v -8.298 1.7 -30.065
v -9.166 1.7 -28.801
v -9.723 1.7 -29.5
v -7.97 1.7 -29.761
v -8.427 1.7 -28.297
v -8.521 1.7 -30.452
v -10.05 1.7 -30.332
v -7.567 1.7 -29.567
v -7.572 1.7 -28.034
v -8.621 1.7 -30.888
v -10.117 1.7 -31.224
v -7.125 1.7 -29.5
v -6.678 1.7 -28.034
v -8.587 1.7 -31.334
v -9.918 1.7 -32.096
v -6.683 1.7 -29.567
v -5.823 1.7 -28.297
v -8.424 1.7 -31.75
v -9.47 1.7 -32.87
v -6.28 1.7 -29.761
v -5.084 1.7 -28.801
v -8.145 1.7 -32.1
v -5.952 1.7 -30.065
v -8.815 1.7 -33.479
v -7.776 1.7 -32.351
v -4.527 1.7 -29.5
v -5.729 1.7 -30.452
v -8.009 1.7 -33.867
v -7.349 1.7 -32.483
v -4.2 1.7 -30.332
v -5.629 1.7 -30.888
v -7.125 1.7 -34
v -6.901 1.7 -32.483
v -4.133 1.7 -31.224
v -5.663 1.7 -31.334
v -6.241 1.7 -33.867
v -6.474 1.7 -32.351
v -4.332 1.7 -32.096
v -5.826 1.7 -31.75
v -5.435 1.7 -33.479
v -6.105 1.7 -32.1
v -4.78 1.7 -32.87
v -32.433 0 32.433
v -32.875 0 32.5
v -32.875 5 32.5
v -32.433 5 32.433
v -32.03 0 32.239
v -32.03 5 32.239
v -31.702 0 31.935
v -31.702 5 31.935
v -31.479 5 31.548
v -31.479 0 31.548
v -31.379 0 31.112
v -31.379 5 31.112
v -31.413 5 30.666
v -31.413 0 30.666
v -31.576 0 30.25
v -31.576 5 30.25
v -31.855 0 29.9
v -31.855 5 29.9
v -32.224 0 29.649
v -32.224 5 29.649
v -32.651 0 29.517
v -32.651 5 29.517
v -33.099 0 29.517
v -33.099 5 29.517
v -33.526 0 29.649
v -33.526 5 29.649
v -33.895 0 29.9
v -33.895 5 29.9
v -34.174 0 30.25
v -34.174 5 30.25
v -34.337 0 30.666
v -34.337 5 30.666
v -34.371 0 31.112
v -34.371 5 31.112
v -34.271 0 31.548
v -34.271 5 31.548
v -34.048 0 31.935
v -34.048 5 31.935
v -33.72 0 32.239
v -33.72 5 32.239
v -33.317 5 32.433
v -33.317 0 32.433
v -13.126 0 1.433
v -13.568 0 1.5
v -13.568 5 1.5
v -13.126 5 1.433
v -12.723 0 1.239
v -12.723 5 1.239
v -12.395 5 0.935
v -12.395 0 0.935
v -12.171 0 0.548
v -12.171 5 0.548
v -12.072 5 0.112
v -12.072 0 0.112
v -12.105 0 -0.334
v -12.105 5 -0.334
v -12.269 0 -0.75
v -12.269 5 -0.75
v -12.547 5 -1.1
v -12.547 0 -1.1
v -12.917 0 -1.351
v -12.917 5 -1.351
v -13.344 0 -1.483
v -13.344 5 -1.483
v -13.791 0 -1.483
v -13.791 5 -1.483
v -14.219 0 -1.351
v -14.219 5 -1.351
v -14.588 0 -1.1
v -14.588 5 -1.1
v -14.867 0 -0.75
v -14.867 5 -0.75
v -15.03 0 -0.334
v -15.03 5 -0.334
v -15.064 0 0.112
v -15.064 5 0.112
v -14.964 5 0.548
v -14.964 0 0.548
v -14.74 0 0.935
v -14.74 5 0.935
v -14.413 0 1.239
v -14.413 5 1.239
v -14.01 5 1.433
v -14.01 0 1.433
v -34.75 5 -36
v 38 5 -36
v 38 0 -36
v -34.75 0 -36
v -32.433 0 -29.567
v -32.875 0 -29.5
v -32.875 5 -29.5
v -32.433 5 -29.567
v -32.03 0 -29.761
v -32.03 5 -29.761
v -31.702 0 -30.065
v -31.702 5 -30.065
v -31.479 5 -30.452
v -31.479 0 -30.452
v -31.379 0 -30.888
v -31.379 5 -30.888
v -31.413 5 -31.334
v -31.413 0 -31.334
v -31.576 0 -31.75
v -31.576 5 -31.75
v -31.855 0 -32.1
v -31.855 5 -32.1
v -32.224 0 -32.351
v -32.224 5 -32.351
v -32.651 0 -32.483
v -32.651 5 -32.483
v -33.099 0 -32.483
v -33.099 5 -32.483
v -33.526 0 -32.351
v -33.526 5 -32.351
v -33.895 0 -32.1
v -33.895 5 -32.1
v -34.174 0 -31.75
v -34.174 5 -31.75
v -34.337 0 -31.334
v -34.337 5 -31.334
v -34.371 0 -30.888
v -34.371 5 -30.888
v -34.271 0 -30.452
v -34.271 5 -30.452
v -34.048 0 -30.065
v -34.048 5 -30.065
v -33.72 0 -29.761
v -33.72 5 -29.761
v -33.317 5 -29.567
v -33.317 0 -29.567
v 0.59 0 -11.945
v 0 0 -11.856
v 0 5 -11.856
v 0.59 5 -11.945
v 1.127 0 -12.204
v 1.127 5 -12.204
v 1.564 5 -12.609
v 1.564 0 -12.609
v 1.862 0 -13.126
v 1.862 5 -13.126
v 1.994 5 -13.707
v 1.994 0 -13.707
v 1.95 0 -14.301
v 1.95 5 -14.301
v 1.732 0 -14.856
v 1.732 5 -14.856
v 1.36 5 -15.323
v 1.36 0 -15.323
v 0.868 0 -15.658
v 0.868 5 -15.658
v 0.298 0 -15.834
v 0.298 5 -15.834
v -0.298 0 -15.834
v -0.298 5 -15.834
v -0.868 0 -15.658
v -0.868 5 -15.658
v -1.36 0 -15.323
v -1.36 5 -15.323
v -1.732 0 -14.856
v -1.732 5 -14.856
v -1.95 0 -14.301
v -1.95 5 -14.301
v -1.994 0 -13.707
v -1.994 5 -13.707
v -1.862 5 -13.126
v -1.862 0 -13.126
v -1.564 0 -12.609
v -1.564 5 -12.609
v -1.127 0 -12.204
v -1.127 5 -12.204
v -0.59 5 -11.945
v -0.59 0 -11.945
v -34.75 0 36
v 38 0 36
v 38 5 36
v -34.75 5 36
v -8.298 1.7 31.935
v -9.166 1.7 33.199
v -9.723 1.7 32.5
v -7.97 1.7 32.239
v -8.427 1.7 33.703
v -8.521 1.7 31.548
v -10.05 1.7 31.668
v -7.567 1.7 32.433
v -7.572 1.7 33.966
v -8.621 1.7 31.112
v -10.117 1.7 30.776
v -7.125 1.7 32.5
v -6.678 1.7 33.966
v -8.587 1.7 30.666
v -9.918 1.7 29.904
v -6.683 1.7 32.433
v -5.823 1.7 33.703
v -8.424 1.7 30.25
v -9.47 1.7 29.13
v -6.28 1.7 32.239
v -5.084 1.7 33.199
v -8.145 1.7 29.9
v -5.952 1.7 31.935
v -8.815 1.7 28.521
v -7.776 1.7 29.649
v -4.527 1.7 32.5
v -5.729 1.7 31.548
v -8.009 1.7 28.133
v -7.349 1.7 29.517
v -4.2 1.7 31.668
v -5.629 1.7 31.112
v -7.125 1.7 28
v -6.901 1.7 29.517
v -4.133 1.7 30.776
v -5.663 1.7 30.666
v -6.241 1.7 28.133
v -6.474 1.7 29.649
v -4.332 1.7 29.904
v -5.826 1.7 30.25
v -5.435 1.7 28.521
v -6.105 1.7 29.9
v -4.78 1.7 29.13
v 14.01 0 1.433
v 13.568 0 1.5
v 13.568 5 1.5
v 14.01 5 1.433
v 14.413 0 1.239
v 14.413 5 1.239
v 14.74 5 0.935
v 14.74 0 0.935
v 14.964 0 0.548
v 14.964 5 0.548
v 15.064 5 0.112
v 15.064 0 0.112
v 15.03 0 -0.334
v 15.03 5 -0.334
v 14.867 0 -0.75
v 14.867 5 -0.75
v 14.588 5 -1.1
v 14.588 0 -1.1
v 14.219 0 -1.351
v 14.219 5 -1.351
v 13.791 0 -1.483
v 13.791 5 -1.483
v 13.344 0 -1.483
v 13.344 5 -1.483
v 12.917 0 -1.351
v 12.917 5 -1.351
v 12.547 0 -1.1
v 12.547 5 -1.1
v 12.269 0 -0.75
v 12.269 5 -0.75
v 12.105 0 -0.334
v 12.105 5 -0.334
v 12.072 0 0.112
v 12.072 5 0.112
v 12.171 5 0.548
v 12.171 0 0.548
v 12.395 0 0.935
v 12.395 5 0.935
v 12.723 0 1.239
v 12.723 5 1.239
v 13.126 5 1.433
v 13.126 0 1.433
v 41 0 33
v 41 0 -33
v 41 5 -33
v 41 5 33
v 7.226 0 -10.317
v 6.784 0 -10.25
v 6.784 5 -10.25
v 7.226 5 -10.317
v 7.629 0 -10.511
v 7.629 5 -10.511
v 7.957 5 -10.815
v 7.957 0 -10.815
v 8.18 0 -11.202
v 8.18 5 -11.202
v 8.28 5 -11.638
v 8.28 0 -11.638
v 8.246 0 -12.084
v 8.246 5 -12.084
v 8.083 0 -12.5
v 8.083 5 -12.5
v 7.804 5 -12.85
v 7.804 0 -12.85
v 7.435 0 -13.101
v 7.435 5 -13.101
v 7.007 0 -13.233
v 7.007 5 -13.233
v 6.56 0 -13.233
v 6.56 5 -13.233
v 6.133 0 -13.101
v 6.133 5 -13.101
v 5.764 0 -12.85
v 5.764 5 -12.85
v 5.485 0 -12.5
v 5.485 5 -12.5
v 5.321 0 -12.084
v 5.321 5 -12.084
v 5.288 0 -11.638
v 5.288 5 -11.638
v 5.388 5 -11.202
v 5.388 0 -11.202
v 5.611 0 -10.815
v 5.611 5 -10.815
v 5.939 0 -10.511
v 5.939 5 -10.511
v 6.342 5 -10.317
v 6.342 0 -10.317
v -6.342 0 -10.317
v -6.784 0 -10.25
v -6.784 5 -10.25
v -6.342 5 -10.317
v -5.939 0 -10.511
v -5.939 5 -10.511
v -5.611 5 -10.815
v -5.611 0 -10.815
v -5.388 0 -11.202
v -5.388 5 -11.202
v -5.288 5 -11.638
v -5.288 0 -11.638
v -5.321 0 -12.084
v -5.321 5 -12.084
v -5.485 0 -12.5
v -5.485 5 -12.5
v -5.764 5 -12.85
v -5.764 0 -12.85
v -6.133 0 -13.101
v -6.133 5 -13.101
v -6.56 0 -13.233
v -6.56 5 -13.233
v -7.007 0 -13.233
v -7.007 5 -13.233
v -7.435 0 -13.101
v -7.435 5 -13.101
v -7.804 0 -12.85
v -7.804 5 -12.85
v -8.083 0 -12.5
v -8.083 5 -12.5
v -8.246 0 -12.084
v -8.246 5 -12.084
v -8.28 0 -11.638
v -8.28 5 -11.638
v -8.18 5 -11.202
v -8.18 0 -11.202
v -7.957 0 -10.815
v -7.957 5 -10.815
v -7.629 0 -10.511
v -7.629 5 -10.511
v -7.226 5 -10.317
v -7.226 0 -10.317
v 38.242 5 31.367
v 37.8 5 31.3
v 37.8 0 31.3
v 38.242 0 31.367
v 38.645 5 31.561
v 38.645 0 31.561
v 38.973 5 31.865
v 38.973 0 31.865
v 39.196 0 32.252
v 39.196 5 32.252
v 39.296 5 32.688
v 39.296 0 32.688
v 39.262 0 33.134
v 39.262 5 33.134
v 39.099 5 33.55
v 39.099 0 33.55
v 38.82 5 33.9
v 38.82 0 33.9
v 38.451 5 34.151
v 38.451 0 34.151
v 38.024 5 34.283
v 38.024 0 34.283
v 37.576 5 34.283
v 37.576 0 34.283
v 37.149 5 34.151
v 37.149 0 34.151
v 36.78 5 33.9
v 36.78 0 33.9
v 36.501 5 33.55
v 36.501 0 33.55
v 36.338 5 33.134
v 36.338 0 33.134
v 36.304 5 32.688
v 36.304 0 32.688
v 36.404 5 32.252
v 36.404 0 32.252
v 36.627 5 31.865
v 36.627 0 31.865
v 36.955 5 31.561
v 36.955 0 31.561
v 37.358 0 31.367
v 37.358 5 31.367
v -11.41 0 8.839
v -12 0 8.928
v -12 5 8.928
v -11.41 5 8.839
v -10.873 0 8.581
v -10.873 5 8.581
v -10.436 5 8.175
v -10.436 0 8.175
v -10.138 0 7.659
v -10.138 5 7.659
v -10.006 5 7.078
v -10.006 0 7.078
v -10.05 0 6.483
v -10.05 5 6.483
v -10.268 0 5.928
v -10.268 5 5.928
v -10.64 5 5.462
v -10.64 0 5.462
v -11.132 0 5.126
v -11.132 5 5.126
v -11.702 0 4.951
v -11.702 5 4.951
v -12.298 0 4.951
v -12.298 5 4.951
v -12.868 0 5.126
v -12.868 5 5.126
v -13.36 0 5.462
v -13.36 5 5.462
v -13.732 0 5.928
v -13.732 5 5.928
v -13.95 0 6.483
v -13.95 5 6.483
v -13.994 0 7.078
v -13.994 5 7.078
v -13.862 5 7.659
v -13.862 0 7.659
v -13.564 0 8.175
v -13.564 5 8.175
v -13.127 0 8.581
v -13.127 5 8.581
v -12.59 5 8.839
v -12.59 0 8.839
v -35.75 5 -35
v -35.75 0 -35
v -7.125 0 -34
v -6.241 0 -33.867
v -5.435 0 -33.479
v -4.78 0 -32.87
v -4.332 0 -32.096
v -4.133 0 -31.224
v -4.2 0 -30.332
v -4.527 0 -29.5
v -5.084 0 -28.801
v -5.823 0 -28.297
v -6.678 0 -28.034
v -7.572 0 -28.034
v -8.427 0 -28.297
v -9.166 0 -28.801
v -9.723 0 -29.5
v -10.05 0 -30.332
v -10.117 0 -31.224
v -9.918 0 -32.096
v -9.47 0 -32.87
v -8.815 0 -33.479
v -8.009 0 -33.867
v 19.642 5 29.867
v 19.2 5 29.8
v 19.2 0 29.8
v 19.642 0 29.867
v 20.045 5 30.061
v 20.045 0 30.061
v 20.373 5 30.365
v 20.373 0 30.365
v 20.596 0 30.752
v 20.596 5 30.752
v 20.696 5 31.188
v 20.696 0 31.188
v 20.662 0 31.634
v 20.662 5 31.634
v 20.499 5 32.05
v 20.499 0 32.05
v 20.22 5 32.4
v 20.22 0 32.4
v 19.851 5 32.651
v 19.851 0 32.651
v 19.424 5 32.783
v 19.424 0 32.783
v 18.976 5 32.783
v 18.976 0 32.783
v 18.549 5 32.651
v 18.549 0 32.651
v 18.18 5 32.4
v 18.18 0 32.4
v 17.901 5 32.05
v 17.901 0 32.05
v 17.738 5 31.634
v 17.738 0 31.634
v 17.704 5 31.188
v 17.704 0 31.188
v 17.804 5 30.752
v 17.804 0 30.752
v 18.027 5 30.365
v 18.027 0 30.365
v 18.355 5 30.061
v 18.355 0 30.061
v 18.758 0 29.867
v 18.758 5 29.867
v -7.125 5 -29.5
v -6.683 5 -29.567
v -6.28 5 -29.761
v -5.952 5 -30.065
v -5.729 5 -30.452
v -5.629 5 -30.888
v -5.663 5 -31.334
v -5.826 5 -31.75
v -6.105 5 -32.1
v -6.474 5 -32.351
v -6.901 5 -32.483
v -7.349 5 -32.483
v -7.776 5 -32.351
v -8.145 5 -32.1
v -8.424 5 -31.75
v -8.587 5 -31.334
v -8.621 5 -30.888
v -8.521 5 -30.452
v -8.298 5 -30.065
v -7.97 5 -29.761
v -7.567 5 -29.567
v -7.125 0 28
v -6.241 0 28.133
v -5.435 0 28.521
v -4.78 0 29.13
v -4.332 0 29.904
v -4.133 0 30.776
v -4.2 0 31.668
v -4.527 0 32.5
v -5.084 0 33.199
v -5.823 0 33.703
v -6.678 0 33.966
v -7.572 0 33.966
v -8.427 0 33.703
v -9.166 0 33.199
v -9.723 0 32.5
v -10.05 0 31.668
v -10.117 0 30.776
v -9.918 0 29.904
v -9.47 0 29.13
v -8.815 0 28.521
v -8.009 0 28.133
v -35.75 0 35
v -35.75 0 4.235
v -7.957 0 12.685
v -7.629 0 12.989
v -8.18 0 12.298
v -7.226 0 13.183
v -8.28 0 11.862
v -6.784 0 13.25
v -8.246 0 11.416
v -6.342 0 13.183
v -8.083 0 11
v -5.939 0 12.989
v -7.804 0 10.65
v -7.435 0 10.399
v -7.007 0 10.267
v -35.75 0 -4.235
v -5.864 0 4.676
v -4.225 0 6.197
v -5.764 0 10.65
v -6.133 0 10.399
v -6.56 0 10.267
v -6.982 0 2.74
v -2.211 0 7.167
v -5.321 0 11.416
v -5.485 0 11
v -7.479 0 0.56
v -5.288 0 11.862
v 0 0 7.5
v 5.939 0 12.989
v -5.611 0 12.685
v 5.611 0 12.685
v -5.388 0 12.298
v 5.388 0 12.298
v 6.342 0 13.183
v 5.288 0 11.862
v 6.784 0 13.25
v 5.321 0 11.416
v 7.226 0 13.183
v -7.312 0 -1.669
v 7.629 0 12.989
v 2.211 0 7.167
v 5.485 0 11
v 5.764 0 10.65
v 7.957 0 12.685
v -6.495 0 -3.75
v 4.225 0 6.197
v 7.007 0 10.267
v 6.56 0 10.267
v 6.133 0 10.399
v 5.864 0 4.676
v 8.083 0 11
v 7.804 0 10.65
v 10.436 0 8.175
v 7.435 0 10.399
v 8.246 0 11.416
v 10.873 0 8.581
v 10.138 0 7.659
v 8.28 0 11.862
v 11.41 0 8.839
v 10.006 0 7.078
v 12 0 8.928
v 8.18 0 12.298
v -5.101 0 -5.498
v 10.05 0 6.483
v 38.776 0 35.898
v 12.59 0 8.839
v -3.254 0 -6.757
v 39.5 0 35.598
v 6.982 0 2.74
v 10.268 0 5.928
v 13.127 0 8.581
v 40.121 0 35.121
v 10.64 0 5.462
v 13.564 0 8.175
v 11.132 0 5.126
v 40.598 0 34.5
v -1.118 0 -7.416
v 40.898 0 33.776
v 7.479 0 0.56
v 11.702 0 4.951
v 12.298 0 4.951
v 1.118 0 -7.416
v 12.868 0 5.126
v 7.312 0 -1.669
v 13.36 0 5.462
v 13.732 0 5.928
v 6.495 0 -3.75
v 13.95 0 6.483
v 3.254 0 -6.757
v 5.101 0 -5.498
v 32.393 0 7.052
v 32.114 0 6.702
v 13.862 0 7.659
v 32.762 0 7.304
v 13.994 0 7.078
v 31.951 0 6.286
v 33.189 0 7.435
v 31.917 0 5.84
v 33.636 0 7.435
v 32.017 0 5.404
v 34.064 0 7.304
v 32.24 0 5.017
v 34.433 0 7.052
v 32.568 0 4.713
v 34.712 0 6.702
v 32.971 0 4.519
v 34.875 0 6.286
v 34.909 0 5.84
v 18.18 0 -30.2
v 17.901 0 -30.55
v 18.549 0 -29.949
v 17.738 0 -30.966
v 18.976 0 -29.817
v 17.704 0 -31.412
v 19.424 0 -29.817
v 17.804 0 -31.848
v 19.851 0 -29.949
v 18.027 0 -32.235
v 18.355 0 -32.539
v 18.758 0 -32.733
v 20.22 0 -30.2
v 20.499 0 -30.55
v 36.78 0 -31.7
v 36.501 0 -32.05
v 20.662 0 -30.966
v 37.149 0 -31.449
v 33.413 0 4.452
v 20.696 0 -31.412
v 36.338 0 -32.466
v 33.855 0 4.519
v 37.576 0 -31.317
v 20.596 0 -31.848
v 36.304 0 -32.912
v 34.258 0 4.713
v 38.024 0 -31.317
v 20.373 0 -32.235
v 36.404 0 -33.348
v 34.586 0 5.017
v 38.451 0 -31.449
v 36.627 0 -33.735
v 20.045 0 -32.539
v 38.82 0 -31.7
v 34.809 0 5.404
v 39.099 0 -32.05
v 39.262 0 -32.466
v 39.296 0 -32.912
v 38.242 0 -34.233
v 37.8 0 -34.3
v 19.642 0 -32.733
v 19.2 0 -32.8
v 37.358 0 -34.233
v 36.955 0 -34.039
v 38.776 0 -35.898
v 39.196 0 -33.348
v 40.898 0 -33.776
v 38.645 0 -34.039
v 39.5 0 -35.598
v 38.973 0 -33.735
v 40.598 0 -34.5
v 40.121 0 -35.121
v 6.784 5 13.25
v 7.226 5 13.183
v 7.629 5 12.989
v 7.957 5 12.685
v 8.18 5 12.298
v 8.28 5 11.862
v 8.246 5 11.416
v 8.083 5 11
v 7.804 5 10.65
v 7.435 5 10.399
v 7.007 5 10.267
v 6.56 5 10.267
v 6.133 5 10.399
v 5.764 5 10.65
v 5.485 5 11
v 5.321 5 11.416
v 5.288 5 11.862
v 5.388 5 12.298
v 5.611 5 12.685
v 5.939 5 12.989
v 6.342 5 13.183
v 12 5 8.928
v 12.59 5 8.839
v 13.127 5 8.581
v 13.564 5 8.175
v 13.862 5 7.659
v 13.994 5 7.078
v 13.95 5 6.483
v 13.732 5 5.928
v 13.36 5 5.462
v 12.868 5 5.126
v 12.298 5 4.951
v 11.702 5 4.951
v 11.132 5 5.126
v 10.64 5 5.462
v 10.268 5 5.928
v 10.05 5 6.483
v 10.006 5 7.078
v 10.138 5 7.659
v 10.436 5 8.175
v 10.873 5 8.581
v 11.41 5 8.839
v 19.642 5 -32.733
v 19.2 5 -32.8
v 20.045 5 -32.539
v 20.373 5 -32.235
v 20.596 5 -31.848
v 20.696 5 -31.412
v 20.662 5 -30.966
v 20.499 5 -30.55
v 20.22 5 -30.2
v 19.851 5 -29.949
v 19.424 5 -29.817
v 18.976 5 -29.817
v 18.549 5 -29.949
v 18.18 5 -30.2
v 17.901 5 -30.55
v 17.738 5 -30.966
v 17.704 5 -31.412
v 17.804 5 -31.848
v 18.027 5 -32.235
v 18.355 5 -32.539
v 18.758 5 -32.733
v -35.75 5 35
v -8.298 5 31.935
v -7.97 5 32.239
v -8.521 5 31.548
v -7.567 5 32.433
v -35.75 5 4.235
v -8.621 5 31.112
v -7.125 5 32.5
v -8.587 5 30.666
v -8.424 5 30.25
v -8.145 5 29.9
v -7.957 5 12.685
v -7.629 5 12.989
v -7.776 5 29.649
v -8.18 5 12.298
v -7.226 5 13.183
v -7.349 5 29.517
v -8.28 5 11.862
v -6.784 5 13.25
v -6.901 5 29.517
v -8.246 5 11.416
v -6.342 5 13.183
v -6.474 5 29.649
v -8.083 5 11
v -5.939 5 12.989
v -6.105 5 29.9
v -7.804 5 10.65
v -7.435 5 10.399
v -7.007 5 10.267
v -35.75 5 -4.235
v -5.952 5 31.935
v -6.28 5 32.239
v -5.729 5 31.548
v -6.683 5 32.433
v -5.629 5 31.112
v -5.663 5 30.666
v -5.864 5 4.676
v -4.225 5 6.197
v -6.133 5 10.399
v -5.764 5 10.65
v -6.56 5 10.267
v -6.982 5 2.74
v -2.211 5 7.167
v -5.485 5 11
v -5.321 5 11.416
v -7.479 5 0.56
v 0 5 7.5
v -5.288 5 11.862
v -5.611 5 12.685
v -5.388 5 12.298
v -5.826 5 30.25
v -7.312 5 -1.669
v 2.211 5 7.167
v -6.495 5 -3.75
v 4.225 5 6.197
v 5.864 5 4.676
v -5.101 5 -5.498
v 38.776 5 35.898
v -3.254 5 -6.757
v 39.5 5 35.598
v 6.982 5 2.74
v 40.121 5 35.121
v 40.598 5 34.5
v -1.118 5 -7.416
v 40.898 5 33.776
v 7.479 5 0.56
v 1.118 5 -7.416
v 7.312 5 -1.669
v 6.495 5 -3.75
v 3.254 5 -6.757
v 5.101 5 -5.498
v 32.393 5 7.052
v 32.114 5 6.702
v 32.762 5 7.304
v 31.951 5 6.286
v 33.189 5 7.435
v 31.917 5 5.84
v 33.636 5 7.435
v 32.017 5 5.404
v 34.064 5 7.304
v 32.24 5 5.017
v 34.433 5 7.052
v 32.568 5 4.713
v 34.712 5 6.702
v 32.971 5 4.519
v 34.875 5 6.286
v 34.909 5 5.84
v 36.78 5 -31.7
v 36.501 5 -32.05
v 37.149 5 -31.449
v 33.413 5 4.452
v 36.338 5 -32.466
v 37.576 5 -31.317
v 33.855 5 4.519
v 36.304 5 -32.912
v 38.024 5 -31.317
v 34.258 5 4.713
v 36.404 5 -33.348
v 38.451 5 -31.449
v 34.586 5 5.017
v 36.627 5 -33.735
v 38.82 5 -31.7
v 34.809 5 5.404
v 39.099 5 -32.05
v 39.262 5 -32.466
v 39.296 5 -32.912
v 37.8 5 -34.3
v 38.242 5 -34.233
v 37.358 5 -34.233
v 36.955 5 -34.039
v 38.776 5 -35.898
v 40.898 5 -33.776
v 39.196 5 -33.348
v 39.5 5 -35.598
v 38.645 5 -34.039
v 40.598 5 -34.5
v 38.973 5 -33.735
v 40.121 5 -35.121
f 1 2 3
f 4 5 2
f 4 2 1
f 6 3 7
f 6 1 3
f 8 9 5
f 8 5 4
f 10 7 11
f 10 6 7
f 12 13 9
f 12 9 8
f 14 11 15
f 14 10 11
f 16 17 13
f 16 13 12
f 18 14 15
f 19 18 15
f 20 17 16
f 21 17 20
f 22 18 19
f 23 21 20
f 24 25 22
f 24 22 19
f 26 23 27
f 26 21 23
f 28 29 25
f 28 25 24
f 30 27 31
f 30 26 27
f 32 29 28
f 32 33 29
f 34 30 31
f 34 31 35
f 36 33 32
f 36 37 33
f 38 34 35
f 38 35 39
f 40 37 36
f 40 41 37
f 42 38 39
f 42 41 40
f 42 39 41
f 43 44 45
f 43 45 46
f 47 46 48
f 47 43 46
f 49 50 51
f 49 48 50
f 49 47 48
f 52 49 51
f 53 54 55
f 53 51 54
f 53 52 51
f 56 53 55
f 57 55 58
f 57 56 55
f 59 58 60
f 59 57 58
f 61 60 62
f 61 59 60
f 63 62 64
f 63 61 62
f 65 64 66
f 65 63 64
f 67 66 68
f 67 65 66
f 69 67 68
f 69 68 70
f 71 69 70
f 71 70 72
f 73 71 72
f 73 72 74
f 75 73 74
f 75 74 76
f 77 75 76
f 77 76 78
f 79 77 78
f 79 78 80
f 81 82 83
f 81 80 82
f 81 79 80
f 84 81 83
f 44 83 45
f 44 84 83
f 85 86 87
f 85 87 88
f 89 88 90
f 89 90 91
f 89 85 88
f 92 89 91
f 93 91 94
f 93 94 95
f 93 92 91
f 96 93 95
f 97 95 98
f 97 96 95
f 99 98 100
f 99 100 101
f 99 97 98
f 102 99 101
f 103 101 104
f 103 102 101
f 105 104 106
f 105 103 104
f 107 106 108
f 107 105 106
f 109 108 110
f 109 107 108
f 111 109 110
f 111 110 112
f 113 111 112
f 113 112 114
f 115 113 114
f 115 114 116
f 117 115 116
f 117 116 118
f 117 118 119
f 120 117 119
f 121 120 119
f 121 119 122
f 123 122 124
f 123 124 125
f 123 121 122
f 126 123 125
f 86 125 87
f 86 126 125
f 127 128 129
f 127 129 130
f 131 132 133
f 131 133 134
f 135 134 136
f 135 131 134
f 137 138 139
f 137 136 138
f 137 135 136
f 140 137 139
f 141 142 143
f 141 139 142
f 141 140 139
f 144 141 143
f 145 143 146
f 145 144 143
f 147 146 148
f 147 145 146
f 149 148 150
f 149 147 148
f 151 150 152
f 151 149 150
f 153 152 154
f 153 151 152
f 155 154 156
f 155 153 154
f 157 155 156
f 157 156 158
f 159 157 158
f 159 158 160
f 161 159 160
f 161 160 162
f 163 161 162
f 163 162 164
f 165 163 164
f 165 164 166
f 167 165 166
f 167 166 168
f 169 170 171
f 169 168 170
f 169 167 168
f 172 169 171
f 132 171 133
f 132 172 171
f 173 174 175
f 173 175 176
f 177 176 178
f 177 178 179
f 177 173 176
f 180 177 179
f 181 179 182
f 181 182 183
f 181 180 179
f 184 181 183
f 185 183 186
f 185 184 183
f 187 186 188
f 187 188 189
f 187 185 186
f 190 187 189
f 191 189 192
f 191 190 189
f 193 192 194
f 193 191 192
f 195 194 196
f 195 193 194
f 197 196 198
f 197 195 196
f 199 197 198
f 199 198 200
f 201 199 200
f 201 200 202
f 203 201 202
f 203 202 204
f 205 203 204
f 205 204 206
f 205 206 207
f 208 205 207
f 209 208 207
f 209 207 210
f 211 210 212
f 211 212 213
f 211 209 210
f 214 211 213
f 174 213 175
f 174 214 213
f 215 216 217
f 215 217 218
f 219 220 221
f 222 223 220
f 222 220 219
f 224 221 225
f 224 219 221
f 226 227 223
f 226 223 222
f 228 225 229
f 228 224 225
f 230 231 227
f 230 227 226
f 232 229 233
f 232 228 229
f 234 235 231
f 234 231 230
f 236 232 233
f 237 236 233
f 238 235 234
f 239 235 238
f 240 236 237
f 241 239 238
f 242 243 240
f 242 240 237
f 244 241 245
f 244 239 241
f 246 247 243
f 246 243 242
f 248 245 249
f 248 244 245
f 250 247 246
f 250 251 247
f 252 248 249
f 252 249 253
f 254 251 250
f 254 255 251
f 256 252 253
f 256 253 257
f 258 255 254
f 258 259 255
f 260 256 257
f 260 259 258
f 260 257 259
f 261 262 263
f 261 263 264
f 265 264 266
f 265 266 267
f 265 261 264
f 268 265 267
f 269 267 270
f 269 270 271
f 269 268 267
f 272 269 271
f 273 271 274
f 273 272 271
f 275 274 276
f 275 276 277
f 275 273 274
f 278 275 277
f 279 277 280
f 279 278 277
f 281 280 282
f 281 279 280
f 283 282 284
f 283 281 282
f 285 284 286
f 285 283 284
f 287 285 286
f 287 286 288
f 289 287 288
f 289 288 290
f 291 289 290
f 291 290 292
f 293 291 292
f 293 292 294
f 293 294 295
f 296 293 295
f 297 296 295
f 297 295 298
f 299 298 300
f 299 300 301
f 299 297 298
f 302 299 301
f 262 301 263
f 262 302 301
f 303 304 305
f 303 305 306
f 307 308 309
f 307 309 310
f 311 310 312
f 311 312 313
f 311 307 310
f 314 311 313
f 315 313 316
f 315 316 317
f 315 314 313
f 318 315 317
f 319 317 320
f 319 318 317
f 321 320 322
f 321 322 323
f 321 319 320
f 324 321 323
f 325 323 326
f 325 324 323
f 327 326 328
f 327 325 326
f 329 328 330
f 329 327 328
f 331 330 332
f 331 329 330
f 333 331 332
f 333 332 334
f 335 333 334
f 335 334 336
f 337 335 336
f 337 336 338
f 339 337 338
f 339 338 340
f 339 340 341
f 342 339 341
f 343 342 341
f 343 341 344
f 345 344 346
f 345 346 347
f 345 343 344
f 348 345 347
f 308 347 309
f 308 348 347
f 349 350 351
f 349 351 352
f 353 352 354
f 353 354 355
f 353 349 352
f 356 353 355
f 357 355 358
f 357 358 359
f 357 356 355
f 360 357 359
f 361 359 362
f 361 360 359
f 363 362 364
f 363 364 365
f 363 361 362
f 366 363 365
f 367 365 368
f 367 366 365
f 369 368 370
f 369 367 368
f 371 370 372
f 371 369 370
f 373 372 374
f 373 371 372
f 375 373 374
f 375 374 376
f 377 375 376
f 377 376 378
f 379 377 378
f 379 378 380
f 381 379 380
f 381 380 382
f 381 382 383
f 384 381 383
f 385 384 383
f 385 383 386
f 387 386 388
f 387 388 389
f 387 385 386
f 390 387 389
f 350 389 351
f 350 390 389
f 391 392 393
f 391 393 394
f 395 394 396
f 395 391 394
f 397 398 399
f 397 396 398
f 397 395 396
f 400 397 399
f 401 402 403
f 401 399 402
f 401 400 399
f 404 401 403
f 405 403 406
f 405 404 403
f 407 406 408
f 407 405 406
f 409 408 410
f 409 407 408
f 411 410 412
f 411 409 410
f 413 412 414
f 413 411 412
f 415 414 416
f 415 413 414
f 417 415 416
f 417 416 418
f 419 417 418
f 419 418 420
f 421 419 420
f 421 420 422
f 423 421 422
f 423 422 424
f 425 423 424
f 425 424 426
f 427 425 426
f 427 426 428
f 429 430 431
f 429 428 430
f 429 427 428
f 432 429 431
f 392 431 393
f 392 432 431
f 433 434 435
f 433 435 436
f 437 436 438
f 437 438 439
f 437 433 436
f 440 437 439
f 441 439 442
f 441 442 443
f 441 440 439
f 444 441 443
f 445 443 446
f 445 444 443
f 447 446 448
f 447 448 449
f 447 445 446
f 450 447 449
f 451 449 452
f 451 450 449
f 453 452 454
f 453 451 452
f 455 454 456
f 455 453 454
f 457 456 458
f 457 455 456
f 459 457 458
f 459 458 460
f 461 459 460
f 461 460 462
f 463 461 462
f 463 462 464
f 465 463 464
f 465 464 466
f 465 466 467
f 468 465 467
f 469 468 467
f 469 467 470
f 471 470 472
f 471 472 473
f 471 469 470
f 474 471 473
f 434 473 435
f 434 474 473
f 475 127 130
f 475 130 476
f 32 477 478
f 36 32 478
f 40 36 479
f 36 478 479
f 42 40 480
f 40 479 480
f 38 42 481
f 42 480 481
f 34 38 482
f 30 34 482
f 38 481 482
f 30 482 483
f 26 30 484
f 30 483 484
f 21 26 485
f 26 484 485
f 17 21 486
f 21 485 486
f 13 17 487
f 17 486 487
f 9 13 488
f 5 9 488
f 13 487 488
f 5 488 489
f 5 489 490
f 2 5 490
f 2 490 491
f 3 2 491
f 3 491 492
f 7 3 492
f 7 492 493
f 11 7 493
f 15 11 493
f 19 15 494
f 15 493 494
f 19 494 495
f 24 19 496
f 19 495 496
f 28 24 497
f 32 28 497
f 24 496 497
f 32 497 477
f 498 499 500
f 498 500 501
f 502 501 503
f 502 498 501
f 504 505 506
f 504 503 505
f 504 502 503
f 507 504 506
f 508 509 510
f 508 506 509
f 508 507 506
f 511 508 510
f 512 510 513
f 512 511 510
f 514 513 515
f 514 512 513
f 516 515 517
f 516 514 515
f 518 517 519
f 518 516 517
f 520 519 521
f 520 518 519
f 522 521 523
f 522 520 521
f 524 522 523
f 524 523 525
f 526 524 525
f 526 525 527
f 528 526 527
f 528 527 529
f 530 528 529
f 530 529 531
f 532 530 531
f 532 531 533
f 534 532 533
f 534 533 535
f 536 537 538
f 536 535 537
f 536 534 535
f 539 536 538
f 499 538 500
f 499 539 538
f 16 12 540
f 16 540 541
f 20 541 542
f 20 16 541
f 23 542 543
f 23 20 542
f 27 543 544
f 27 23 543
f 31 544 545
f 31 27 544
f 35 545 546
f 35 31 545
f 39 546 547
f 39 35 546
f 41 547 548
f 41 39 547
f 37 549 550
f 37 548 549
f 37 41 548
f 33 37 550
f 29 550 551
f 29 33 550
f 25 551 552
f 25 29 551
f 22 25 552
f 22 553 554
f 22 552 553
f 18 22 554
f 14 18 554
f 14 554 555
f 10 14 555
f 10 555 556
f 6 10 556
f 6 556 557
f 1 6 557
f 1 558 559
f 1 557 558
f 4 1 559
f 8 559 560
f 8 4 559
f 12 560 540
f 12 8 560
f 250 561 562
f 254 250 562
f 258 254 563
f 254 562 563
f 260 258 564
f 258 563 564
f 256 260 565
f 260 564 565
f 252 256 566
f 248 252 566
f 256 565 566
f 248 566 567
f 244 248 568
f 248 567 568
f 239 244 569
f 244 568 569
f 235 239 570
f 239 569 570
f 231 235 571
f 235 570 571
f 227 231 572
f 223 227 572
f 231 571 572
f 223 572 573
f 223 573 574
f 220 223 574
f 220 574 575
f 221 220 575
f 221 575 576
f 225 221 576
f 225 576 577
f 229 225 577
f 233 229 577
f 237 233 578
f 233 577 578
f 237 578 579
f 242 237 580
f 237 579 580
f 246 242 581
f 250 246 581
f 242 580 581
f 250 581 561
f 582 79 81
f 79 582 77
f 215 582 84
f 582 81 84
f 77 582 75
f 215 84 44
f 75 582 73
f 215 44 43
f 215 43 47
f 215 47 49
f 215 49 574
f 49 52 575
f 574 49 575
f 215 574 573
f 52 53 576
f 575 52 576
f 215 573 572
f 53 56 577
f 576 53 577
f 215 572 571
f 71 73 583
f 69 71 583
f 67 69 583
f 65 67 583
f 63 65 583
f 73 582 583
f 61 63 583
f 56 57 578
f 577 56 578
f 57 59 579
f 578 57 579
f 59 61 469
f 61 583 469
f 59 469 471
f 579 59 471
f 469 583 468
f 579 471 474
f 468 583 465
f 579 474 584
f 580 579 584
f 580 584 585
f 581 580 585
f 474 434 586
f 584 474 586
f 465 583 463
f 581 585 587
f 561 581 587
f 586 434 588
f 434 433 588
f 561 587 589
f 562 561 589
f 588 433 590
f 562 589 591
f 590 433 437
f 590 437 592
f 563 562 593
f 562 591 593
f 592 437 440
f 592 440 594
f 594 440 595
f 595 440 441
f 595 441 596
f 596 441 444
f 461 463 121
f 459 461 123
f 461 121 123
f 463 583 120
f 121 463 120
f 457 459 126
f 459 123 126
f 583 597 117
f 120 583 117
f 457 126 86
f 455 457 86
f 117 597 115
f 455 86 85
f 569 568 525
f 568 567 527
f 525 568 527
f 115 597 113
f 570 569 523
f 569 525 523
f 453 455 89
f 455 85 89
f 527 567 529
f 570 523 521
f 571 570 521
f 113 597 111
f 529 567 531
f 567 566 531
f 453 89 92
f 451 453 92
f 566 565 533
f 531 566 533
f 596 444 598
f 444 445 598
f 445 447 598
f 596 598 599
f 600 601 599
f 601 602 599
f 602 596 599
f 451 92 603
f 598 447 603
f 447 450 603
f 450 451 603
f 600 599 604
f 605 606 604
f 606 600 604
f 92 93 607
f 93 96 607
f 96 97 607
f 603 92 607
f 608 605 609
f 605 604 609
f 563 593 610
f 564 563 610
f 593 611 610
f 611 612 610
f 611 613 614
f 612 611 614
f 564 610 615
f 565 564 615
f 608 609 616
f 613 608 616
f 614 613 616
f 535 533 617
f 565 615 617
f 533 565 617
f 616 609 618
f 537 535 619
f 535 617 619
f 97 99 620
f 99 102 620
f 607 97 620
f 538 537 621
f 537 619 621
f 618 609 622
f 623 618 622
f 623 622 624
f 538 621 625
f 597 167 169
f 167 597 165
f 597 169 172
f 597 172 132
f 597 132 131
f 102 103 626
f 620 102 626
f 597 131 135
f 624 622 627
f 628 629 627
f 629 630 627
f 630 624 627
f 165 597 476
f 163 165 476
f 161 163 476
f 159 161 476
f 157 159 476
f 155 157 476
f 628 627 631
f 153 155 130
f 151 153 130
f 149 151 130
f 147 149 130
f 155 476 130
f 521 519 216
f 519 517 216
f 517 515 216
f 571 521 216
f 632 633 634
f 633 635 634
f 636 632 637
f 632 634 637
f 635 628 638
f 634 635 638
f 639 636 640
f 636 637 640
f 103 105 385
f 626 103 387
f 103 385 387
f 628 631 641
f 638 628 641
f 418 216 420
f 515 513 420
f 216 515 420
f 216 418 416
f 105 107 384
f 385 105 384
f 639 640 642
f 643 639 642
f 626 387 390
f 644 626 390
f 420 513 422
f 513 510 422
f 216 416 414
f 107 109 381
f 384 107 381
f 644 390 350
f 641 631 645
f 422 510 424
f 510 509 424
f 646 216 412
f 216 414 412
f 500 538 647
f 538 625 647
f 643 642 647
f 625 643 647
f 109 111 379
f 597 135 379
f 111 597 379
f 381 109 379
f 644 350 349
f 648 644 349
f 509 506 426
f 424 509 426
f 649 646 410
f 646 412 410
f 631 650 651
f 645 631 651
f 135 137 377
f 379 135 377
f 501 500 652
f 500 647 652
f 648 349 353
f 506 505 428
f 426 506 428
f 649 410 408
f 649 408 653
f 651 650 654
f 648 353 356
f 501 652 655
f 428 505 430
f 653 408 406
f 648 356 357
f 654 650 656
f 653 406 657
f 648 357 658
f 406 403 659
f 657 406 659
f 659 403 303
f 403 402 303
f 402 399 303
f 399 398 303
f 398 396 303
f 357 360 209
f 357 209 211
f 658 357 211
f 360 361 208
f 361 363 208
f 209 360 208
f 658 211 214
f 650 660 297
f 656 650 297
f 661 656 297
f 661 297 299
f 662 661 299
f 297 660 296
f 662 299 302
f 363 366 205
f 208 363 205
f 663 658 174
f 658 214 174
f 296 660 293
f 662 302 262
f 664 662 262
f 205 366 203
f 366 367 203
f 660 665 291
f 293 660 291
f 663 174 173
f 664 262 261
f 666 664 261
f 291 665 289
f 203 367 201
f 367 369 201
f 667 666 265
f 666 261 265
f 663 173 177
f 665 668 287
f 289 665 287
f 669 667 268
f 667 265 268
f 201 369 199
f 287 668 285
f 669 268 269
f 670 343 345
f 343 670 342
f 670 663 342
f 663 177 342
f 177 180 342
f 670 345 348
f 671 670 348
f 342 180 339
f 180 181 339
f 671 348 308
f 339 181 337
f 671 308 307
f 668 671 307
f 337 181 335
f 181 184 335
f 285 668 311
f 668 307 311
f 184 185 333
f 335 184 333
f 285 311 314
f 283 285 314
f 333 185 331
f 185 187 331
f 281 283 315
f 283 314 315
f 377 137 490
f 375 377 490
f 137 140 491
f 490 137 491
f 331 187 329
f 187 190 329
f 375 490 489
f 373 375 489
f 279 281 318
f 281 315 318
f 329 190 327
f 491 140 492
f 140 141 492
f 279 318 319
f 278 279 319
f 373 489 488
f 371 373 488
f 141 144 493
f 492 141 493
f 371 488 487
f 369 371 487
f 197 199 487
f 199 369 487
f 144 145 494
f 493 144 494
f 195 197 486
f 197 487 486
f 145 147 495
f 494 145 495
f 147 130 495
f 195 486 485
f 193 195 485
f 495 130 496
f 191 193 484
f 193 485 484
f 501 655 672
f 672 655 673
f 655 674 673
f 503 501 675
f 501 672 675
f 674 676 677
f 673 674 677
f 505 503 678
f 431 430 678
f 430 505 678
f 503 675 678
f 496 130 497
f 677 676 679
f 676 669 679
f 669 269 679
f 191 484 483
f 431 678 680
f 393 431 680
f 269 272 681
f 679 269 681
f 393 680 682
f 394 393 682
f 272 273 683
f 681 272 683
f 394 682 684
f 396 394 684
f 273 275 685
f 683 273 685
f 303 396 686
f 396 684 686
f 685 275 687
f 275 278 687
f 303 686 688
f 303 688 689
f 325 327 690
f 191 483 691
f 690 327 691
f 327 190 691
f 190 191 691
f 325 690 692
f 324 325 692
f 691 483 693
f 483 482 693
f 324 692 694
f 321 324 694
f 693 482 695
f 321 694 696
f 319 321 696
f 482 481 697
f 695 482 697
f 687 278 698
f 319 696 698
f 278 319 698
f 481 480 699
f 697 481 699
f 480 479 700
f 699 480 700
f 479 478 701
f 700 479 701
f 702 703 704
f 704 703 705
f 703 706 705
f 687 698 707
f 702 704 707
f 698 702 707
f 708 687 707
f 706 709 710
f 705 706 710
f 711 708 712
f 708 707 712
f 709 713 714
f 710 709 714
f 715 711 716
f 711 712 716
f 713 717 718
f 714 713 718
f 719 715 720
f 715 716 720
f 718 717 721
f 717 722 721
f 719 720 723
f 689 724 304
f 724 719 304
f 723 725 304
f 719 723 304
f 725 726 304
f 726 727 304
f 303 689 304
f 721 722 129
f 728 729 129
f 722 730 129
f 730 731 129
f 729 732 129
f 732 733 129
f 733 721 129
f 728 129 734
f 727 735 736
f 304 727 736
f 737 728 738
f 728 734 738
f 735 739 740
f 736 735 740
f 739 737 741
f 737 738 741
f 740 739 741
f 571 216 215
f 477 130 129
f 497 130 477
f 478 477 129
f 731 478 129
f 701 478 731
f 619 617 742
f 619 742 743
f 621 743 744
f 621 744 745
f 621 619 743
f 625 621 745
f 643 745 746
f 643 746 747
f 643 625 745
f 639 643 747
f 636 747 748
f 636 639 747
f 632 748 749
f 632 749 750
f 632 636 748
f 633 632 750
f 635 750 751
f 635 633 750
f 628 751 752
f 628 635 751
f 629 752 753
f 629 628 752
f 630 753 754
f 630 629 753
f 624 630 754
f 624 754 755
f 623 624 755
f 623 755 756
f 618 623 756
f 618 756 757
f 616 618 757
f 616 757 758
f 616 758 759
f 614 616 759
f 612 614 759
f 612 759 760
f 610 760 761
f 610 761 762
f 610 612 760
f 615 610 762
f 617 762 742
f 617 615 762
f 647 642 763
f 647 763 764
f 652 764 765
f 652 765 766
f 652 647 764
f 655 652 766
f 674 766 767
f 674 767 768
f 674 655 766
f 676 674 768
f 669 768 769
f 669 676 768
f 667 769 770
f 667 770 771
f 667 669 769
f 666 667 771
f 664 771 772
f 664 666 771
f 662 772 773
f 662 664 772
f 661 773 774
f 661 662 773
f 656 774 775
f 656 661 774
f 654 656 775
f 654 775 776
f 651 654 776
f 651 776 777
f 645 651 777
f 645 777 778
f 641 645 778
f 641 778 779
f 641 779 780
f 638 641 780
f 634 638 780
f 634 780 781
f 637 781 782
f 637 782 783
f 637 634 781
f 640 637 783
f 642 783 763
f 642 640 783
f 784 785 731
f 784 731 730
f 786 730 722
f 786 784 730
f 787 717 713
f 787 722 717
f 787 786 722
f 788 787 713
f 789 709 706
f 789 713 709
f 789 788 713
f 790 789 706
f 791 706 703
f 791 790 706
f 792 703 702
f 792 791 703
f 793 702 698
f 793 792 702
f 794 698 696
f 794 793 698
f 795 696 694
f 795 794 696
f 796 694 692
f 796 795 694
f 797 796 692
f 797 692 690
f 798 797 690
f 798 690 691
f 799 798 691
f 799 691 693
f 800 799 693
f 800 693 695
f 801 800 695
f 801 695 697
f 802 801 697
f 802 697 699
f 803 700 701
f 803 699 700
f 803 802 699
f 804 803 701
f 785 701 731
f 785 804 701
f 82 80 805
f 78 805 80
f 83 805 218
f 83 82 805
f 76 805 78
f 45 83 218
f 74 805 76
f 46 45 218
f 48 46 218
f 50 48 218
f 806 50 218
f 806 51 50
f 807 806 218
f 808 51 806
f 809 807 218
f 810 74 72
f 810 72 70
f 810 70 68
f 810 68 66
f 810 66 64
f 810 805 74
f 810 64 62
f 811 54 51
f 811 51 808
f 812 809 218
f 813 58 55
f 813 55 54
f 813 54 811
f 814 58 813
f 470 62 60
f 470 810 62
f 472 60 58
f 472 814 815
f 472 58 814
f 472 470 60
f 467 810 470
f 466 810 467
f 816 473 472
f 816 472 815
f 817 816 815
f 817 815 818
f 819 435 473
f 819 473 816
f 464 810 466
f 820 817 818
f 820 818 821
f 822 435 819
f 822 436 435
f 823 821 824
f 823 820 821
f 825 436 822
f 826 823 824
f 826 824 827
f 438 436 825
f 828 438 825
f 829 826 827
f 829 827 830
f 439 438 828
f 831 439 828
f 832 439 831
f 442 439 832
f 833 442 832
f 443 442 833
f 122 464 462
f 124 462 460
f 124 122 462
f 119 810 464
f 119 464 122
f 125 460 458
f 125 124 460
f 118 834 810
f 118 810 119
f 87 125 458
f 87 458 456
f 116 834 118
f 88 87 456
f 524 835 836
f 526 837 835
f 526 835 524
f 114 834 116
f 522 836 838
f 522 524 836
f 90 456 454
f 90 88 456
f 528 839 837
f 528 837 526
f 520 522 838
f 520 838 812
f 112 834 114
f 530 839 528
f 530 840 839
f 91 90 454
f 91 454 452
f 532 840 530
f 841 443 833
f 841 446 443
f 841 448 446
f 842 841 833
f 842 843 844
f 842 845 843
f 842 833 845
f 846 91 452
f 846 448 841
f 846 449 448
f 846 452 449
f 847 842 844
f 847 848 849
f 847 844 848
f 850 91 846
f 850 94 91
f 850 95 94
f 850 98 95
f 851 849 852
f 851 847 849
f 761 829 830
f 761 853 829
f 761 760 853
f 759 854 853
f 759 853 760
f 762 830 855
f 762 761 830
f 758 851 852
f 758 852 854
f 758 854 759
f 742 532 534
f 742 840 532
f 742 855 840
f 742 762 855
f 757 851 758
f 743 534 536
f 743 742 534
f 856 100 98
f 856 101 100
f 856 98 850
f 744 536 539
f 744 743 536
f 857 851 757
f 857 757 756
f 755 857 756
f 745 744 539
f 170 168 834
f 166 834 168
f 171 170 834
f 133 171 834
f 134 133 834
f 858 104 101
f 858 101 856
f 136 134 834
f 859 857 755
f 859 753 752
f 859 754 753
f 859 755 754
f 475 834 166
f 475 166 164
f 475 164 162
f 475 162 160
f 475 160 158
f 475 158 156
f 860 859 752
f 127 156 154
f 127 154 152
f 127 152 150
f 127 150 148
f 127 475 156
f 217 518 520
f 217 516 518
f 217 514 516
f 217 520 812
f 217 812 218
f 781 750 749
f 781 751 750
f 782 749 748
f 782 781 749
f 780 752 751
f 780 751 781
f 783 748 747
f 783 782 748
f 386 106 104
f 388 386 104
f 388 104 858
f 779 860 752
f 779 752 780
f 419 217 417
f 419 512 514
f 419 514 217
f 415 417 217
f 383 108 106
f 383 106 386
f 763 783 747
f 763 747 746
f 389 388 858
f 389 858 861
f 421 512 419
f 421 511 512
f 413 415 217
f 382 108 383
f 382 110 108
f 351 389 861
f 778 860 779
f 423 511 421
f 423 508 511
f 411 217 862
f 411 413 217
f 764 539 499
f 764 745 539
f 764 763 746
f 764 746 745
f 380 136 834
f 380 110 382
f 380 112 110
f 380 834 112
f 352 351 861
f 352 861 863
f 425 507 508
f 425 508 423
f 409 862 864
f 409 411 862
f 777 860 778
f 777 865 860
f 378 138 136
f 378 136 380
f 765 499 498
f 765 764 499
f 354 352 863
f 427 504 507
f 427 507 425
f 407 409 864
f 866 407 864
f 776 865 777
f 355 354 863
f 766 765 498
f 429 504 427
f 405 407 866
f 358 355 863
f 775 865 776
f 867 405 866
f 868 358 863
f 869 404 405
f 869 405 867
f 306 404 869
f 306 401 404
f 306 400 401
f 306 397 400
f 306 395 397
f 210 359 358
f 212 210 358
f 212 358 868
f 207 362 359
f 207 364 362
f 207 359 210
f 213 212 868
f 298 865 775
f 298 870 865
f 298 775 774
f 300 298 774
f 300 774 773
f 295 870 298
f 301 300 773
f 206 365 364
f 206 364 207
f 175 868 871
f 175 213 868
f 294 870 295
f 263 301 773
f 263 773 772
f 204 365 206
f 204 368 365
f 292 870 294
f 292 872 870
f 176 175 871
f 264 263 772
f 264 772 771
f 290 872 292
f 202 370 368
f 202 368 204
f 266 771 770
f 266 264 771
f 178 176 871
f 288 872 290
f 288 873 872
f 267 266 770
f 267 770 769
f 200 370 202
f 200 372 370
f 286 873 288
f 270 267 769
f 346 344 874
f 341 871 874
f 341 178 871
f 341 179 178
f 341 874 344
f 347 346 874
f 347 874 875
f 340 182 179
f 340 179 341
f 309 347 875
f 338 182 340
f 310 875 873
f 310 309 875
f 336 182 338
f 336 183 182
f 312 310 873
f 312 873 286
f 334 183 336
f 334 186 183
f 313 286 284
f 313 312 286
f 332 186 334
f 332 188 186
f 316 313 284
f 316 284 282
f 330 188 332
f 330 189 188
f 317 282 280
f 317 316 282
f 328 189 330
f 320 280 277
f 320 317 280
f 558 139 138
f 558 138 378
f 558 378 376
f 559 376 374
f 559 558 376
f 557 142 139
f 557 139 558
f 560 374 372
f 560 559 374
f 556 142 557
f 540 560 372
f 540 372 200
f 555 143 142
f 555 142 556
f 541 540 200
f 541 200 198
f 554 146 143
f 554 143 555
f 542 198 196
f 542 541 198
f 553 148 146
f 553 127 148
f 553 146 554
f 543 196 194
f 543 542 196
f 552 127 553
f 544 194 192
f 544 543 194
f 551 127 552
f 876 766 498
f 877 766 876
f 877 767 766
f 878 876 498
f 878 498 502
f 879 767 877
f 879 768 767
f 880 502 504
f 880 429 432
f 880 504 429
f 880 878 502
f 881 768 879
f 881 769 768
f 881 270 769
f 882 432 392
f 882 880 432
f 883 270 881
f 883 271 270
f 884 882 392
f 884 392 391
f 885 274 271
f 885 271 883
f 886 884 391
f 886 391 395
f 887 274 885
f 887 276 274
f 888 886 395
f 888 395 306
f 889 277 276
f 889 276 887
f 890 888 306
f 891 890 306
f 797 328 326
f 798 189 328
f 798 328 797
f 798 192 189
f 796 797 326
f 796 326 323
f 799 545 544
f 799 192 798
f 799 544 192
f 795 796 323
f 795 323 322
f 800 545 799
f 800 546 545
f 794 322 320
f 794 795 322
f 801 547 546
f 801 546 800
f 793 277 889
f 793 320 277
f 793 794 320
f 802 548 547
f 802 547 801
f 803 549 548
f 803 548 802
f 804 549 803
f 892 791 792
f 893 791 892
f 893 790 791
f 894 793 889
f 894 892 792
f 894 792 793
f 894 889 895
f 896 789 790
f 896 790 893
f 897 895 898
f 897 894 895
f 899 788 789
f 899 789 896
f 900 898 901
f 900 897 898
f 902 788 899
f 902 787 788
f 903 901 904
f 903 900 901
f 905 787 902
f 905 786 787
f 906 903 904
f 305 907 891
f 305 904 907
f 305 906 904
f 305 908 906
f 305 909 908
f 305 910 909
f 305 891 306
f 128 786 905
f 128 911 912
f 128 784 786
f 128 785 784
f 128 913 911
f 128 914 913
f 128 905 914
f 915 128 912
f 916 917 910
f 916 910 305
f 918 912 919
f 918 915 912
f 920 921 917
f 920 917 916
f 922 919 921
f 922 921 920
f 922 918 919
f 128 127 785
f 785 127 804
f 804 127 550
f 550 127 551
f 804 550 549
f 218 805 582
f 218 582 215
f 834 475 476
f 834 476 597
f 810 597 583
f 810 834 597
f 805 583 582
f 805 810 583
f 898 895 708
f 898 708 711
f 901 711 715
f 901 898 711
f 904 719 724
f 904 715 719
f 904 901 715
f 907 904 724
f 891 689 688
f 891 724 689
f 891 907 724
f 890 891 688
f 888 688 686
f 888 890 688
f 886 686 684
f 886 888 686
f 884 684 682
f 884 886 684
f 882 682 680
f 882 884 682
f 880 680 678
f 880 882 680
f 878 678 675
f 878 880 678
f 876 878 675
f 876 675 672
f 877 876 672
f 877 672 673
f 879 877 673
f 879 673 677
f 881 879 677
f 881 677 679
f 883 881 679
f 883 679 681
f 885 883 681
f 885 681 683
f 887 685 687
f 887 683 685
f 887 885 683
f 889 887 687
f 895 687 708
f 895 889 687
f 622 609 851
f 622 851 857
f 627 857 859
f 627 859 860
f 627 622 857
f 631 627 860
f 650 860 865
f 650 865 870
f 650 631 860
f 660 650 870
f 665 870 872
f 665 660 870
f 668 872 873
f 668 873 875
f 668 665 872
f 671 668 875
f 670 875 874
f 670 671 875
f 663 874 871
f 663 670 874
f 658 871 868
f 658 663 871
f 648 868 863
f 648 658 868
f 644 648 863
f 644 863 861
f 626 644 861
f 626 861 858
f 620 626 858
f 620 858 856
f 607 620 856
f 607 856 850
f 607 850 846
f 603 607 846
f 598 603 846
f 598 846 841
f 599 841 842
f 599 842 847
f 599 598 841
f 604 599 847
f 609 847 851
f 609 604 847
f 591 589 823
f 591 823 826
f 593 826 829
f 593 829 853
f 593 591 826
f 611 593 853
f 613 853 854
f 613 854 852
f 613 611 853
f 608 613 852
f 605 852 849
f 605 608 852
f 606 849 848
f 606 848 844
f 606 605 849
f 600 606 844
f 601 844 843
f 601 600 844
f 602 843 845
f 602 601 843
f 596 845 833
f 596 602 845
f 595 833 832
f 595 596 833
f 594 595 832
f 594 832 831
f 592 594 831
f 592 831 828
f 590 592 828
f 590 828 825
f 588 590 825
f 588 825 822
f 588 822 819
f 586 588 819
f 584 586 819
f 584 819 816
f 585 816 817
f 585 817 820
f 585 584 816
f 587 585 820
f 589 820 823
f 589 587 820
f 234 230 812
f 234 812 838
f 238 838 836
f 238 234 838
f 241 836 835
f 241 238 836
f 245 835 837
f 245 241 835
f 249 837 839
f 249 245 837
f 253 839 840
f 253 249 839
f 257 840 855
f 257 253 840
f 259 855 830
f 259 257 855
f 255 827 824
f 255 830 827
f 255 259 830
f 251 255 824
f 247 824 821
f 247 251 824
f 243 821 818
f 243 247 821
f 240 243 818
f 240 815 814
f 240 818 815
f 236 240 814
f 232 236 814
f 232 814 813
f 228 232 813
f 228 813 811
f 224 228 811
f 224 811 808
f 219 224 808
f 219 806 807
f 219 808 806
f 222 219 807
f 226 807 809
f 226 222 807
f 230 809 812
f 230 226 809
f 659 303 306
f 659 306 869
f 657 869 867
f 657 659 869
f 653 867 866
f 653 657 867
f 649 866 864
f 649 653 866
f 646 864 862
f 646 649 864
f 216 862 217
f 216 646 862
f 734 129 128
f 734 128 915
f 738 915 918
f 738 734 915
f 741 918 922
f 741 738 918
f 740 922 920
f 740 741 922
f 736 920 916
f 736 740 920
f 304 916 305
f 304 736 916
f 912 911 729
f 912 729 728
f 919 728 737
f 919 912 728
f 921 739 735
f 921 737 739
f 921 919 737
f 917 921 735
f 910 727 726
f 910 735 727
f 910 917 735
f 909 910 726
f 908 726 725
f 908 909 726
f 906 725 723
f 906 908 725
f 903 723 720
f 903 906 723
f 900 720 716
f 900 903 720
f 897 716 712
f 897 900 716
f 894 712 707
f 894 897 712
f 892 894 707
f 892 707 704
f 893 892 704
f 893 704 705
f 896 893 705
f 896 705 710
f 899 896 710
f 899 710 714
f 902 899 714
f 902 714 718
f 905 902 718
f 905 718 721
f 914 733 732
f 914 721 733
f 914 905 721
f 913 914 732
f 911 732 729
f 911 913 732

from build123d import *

# Parameters (mm, degrees)
SKETCH_1_R               = 7.5
SKETCH_1_R_2             = 1.5
SKETCH_1_R_3             = 2
EXTRUDE_1_DEPTH          = 5
EXTRUDE_2_DEPTH          = 5
CUT_EXTRUDE_1_DEPTH      = 55.790510127
CUT_EXTRUDE_1_DEPTH_BACK = 55.790510127
SKETCH_4_W               = 18.755882419
SKETCH_4_H               = 70
CUT_EXTRUDE_2_DEPTH      = 55.790510127
CUT_EXTRUDE_2_DEPTH_BACK = 55.790510127
SKETCH_5_R               = 1.5
CUT_EXTRUDE_3_DEPTH      = 55.790510127
CUT_EXTRUDE_3_DEPTH_BACK = 55.790510127
SKETCH_7_R               = 1.5
SKETCH_8_R               = 3
CUT_EXTRUDE_4_DEPTH      = 1.7


with BuildPart() as part:
    # 草图1 → 凸台-拉伸1 (new body)
    with BuildSketch(Plane(origin=(0, 0, 0), x_dir=(1, 0, 0), z_dir=(0, 1, 0))):
        with BuildLine():
            Line((0, 36), (38, 36))
            ThreePointArc((38, 36), (40.121320344, 35.121320344), (41, 33))
            Line((41, 33), (41, -33))
            ThreePointArc((41, -33), (40.121320344, -35.121320344), (38, -36))
            Line((38, -36), (0, -36))
            ThreePointArc((0, -36), (-36, 0), (0, 36))
        make_face()
        with Locations(Location((0, 0, 0), (0, 0, 270))):
            Circle(SKETCH_1_R, mode=Mode.SUBTRACT)
        with Locations(Location((-6.783865663, 11.75, 0), (0, 0, 270))):
            Circle(SKETCH_1_R_2, mode=Mode.SUBTRACT)
        with Locations(Location((6.783865663, 11.75, 0), (0, 0, 270))):
            Circle(SKETCH_1_R_2, mode=Mode.SUBTRACT)
        with Locations(Location((13.567731326, 0, 0), (0, 0, 270))):
            Circle(SKETCH_1_R_2, mode=Mode.SUBTRACT)
        with Locations(Location((6.783865663, -11.75, 0), (0, 0, 270))):
            Circle(SKETCH_1_R_2, mode=Mode.SUBTRACT)
        with Locations(Location((-6.783865663, -11.75, 0), (0, 0, 270))):
            Circle(SKETCH_1_R_2, mode=Mode.SUBTRACT)
        with Locations(Location((-13.567731326, 0, 0), (0, 0, 270))):
            Circle(SKETCH_1_R_2, mode=Mode.SUBTRACT)
        with Locations(Location((-12, -6.92820323, 0), (0, 0, 270))):
            Circle(SKETCH_1_R_3, mode=Mode.SUBTRACT)
        with Locations(Location((0, 13.856406461, 0), (0, 0, 270))):
            Circle(SKETCH_1_R_3, mode=Mode.SUBTRACT)
        with Locations(Location((12, -6.92820323, 0), (0, 0, 270))):
            Circle(SKETCH_1_R_3, mode=Mode.SUBTRACT)
    extrude(amount=EXTRUDE_1_DEPTH)

    # 草图3 → 凸台-拉伸2 (add)
    with BuildSketch(Plane(origin=(0, 5, 0), x_dir=(1, 0, 0), z_dir=(0, 1, 0))):
        with BuildLine():
            Line((0, 36), (-34.75, 36))
            Line((-34.75, 36), (-35.75, 35))
            Line((-35.75, 35), (-35.75, -35))
            Line((-35.75, -35), (-34.75, -36))
            Line((-34.75, -36), (0, -36))
            ThreePointArc((0, -36), (-34.929573093, 0), (0, 36))
        make_face()
    extrude(amount=-EXTRUDE_2_DEPTH)

    # 草图4 → 切除-拉伸1 (cut, two sides: drawn at the far end of the back side and taken through both)
    with BuildSketch(Plane.XZ.offset(-CUT_EXTRUDE_1_DEPTH_BACK)):
        with Locations((-45.12794121, 0)):
            Rectangle(SKETCH_4_W, SKETCH_4_H)
    extrude(amount=CUT_EXTRUDE_1_DEPTH + CUT_EXTRUDE_1_DEPTH_BACK, mode=Mode.SUBTRACT)

    # 草图5 → 切除-拉伸2 (cut, two sides: drawn at the far end of the back side and taken through both)
    with BuildSketch(Plane(origin=(0, 5, 0), x_dir=(1, 0, 0), z_dir=(0, 1, 0)).offset(-CUT_EXTRUDE_2_DEPTH_BACK)):
        with Locations(Location((-7.125, -31, 0), (0, 0, 270))):
            Circle(SKETCH_5_R)
        with Locations(Location((-32.875, -31, 0), (0, 0, 270))):
            Circle(SKETCH_5_R)
        with Locations(Location((-7.125, 31, 0), (0, 0, 270))):
            Circle(SKETCH_5_R)
        with Locations(Location((-32.875, 31, 0), (0, 0, 270))):
            Circle(SKETCH_5_R)
    extrude(amount=CUT_EXTRUDE_2_DEPTH + CUT_EXTRUDE_2_DEPTH_BACK, mode=Mode.SUBTRACT)

    # 草图7 → 切除-拉伸3 (cut, two sides: drawn at the far end of the back side and taken through both)
    with BuildSketch(Plane.XZ.offset(-CUT_EXTRUDE_3_DEPTH_BACK)):
        with Locations(Location((37.8, -32.8, 0), (0, 0, 270))):
            Circle(SKETCH_7_R)
        with Locations(Location((19.2, -31.3, 0), (0, 0, 270))):
            Circle(SKETCH_7_R)
        with Locations(Location((33.412894333, 5.952122667, 0), (0, 0, 270))):
            Circle(SKETCH_7_R)
        with Locations(Location((37.8, 32.8, 0), (0, 0, 270))):
            Circle(SKETCH_7_R)
        with Locations(Location((19.2, 31.3, 0), (0, 0, 270))):
            Circle(SKETCH_7_R)
    extrude(amount=CUT_EXTRUDE_3_DEPTH + CUT_EXTRUDE_3_DEPTH_BACK, mode=Mode.SUBTRACT)

    # 草图8 → 切除-拉伸4 (cut)
    with BuildSketch(Plane.XZ):
        with Locations(Location((-7.125, 31, 0), (0, 0, 270))):
            Circle(SKETCH_8_R)
        with Locations(Location((-7.125, -31, 0), (0, 0, 270))):
            Circle(SKETCH_8_R)
    extrude(amount=-CUT_EXTRUDE_4_DEPTH, mode=Mode.SUBTRACT)


solid = part.part
